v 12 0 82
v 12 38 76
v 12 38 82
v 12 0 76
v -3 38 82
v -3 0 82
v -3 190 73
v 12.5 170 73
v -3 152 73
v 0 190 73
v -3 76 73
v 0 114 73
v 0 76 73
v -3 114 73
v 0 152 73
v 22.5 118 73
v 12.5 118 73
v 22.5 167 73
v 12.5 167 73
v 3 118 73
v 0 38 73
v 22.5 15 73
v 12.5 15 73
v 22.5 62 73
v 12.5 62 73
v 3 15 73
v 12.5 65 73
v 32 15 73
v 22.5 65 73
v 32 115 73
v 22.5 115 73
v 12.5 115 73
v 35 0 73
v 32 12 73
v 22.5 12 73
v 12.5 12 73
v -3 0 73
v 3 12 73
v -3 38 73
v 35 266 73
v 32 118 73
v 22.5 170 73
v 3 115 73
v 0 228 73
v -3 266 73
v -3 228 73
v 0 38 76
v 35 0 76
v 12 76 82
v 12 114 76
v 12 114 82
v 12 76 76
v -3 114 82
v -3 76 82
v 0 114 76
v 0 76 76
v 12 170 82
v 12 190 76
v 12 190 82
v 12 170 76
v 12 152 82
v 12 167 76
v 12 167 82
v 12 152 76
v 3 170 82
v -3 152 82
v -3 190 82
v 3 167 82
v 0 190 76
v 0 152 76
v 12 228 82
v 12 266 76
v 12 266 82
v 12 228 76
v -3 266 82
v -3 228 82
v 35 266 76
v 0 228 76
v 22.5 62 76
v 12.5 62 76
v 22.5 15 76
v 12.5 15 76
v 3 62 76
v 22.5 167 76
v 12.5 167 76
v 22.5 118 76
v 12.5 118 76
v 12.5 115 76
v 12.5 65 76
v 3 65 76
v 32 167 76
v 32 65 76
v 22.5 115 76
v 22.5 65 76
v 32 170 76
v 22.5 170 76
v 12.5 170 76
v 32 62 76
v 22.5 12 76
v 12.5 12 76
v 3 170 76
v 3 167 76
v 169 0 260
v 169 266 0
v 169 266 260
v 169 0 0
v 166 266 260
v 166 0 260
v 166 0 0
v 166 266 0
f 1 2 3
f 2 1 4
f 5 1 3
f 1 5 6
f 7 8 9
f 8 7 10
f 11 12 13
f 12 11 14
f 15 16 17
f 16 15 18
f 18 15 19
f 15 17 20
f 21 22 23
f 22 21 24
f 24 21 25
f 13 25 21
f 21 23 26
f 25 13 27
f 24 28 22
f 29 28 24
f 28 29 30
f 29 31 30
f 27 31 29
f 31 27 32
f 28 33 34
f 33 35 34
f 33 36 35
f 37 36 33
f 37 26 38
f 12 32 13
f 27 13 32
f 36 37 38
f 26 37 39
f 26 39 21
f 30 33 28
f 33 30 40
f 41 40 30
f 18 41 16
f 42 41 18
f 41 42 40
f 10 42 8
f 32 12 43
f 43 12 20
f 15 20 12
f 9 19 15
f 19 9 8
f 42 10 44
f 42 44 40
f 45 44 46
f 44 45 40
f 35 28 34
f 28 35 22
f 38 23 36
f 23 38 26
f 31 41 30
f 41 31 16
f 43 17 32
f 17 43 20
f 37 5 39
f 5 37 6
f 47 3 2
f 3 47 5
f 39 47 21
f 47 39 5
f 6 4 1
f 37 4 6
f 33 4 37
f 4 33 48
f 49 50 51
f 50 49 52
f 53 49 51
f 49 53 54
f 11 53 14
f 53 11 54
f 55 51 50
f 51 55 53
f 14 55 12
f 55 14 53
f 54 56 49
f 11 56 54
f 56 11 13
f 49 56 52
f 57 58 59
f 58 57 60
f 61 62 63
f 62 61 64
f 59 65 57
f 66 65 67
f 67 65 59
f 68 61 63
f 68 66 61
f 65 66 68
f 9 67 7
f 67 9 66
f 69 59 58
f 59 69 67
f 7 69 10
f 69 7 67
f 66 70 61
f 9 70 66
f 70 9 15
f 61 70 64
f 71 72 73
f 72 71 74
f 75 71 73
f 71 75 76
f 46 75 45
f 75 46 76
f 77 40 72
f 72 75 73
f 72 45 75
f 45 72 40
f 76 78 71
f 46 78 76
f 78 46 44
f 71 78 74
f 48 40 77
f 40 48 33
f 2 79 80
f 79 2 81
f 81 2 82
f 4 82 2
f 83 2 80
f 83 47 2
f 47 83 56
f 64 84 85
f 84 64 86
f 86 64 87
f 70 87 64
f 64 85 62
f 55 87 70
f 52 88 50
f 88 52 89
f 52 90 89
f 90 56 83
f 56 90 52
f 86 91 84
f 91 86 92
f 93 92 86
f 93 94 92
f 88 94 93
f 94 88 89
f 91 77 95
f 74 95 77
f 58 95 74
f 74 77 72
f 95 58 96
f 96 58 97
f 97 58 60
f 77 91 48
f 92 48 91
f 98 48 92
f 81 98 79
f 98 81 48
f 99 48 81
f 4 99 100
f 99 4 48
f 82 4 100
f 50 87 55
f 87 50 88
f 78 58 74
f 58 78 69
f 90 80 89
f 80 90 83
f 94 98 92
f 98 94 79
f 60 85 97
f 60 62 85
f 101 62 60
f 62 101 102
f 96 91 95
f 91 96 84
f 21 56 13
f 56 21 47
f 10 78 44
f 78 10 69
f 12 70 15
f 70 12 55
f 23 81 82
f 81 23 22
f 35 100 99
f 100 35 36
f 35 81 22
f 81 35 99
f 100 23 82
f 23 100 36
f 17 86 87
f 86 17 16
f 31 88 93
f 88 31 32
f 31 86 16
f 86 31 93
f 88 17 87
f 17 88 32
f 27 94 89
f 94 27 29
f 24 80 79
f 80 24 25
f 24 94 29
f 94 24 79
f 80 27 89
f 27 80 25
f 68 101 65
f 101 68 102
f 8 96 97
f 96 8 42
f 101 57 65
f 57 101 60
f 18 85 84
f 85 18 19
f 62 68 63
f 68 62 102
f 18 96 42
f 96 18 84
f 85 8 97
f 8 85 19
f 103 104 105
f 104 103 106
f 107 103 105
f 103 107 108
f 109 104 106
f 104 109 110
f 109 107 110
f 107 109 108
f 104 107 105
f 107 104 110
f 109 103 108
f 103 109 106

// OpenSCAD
zyxelNasColor = [
    (26 / 255),
    (188 / 255),
    (156 / 255)
];
nasWidth = 124;
nasHeight = 164;
nasDepth = 206;
nasBackCableSapce = 42;

switchColor = [
    (155 / 255),
    (89 / 255),
    (182 / 255)
];
switchWidth = 117;
switchHeight = 26;
switchDepth = 65;
switchBackCableSapce = 60;
switchLeftCableSapce = 14;

raspPiColor = [
    (231 / 255),
    (76 / 255),
    (60 / 255)
];
raspPiWidth = 68;
raspPiHeight = 45;
raspPiDepth = 104;
raspPiBackCableSapce = 40;
raspPiRightCableSapce = 30;

ankerHubColor = [
    (46 / 255),
    (204 / 255),
    (113 / 255)
];
ankerHubWidth = 26;
ankerHubHeight = 70;
ankerHubDepth = 100;
ankerHubBackCableSapce = 64;

networkSwitchColor = [
    (52 / 255),
    (73 / 255),
    (94 / 255)
];
networkSwitchWidth = 29;
networkSwitchHeight = 158;
networkSwitchDepth = 102;
networkSwitchBackCableSapce = 45;
networkSwitchFrontCableSapce = 50;

frontCoverColor = [
    (231 / 255),
    (76 / 255),
    (60 / 255)
];

module zxyelNas() {
    totalDepth = nasDepth + nasBackCableSapce;
    
    color(zyxelNasColor)
    
    cube([nasWidth, nasDepth, nasHeight]);
}

module hdmiSwitch() {
    totalWidth = switchWidth + switchLeftCableSapce;
    totalDepth = switchDepth + switchBackCableSapce;
    
    color(switchColor)
    translate([switchLeftCableSapce, 0, 0]) {
        cube([switchWidth, switchDepth, switchHeight]);
    }
}

module raspPi() {
    totalWidth = raspPiWidth + raspPiRightCableSapce;
    totalDepth = raspPiDepth + raspPiBackCableSapce;
    
    color(raspPiColor)
    
    cube([totalWidth, totalDepth, raspPiHeight]);
}

module ankerHub() {
    
    color(ankerHubColor)
    
    cube([ankerHubWidth, ankerHubDepth, ankerHubHeight]);
}

module networkSwitch() {
    totalDepth = networkSwitchDepth + networkSwitchBackCableSapce + networkSwitchFrontCableSapce;
    
    color(networkSwitchColor)
    translate([0, networkSwitchFrontCableSapce, 0]) {
        cube([networkSwitchWidth, networkSwitchDepth, networkSwitchHeight]);
    }
}

acrylicThickness = 3;
itemIdentation = 12 + acrylicThickness;

leftThickness = acrylicThickness + networkSwitchWidth + acrylicThickness;

rightThickness = switchWidth + switchLeftCableSapce + acrylicThickness;

boxWidth = leftThickness + rightThickness;
boxDepth = 266;
boxHeight = acrylicThickness + nasHeight + acrylicThickness + switchHeight + acrylicThickness + raspPiHeight + 16;

module base() {
    cube([boxWidth, boxDepth, acrylicThickness]);
}

module left() {
    echo(boxHeight);
    echo(boxDepth);
    cube([acrylicThickness, boxDepth, boxHeight]);
}

module ankerHubHolder(extendTeeth = false) {
    numberOfTeeth = 5;
    totalTeethHeight = ankerHubHeight + (acrylicThickness * 2);
    toothHeight = totalTeethHeight / numberOfTeeth;
    
    teethWidth = extendTeeth ? (acrylicThickness * 3) : 0;
    
    union() {
        difference() {
             translate([-(teethWidth / 2), 0, acrylicThickness]) {
                color(frontCoverColor) cube([networkSwitchWidth + (2 * acrylicThickness) + teethWidth, acrylicThickness, ankerHubHeight]);
             }
            
            translate([((networkSwitchWidth - (ankerHubWidth - 8)) / 2 + acrylicThickness), -acrylicThickness, 2 + acrylicThickness]) {
                cube([ankerHubWidth - 8, acrylicThickness * 3, ankerHubHeight - 2 - 8]);
            }
            
            teethLeftX = -teethWidth - acrylicThickness;
            for(zPosition = [0 : 2 : numberOfTeeth]) {
                translate([teethLeftX, - acrylicThickness, zPosition * toothHeight]) {
                    cube([teethWidth + (acrylicThickness * 2), acrylicThickness * 3, toothHeight]);
                }
            }
            
            teethRightX = ankerHubWidth + (acrylicThickness * 2);
            for(zPosition = [0 : 2 : numberOfTeeth]) {
                translate([teethRightX, - acrylicThickness, zPosition * toothHeight]) {
                    cube([teethWidth + (acrylicThickness * 2), acrylicThickness * 3, toothHeight]);
                }
            }
        }
        
        translate([(networkSwitchWidth / 2) - (10 / 2) + acrylicThickness, 0, -teethWidth]) {
            color(frontCoverColor) cube([10, acrylicThickness, teethWidth + acrylicThickness]);
        }
        
        translate([(networkSwitchWidth / 2) - (10 / 2) + acrylicThickness, 0, ankerHubHeight + acrylicThickness]) {
            color(frontCoverColor) cube([10, acrylicThickness, teethWidth + acrylicThickness]);
        }
    }
}

module ankerHubFrontBack(extendTeeth = false) {
    // Anker Hub Front    
    translate([0, itemIdentation - acrylicThickness, 0]) {
        ankerHubHolder(extendTeeth);
    }
    
    // Anker Hub Back
    translate([0, itemIdentation + ankerHubDepth, 0]) {
        ankerHubHolder(extendTeeth);
    }
}

module networkSwitchHolder(extendTeeth = false) {
    numberOfTeeth = 7;
    totalTeethHeight = boxHeight - ankerHubHeight;
    toothHeight = totalTeethHeight / numberOfTeeth;
    
    teethWidth = extendTeeth ? (acrylicThickness * 3) : 0;
    
    difference() {
        translate([-(teethWidth / 2), 0, acrylicThickness]) {
            color(frontCoverColor) cube([
                networkSwitchWidth + (2 * acrylicThickness) + teethWidth,
                acrylicThickness,
                boxHeight - ankerHubHeight - acrylicThickness + teethWidth
            ]);
        }
        
        // Cut out the middle
        translate([(networkSwitchWidth / 2) - ((networkSwitchWidth - 4) / 2) + acrylicThickness, -acrylicThickness, 12 + acrylicThickness]) {
            cube([networkSwitchWidth - 4, acrylicThickness * 3, networkSwitchHeight - 24]);
        }
        
        // Cut out the top
        translate([(networkSwitchWidth / 2) - (18 / 2) + acrylicThickness, -acrylicThickness, (((boxHeight - ankerHubHeight) - networkSwitchHeight) / 2) - 9 + networkSwitchHeight]) {
            cube([18, acrylicThickness * 3, 26 + teethWidth]);
        }
        
        teethLeftX = -teethWidth - acrylicThickness;
        for(zPosition = [0 : 2 : numberOfTeeth]) {
            translate([teethLeftX, - acrylicThickness, zPosition * toothHeight]) {
                cube([teethWidth + (acrylicThickness * 2), acrylicThickness * 3, toothHeight]);
            }
        }
        
        teethRightX = networkSwitchWidth + acrylicThickness;
        for(zPosition = [0 : 2 : numberOfTeeth]) {
            translate([teethRightX, - acrylicThickness, zPosition * toothHeight]) {
                cube([teethWidth + (acrylicThickness * 2), acrylicThickness * 3, toothHeight]);
            }
        }
        
        translate([teethLeftX, - acrylicThickness, numberOfTeeth * toothHeight]) {
            cube([teethWidth + (acrylicThickness * 2), acrylicThickness * 3, toothHeight]);
        }
        translate([teethRightX, - acrylicThickness, numberOfTeeth * toothHeight]) {
            cube([teethWidth + (acrylicThickness * 2), acrylicThickness * 3, toothHeight]);
        }
    }
    
    translate([(networkSwitchWidth / 2) - (10 / 2) + acrylicThickness, 0, -teethWidth]) {
        color(frontCoverColor) cube([10, acrylicThickness, acrylicThickness + teethWidth]);
    }
}

module networkSwitchFrontBack(extendTeeth) {
    teethHeight = networkSwitchHeight + (acrylicThickness * 2);
    numberOfTeeth = teethHeight / 7;
    
    // Network Switch Front
    translate([0, networkSwitchFrontCableSapce + itemIdentation - acrylicThickness, ankerHubHeight + acrylicThickness]) {
        networkSwitchHolder(extendTeeth);
    }
    
    // Network Switch Back
    translate([0, networkSwitchFrontCableSapce + itemIdentation + networkSwitchDepth, ankerHubHeight + acrylicThickness]) {
        networkSwitchHolder(extendTeeth);
    }
}

module leftFirstShelf() {
    extendTeeth = true;
    numberOfTeeth = 7;
    totalTeethDepth = boxDepth;
    toothDepth = totalTeethDepth / numberOfTeeth;
    
    teethWidth = extendTeeth ? (acrylicThickness * 3) : 0;
    
    difference() {
        translate([0, 0, acrylicThickness + ankerHubHeight]) {
            cube([networkSwitchWidth + (acrylicThickness * 2), boxDepth, acrylicThickness]);
            
            teethLeftX = -teethWidth - acrylicThickness;
            for(yPosition = [0 : 2 : numberOfTeeth]) {
                translate([- acrylicThickness, yPosition * toothDepth, 0]) {
                    cube([teethWidth + (acrylicThickness * 2), toothDepth, acrylicThickness * 3]);
                }
            }
        }
        
        ankerHubFrontBack(true);
    
        networkSwitchFrontBack(true);
    }
    
    // ankerHubFrontBack();
    
    // networkSwitchFrontBack();
}

module rightFirstShelf() {
    translate([leftThickness, 0, acrylicThickness + nasHeight]) {
        cube([rightThickness, boxDepth, acrylicThickness]);
    }
}

module rightSecondShelf() {
    translate([leftThickness, 0, acrylicThickness + nasHeight + acrylicThickness + switchHeight]) {
        cube([rightThickness, boxDepth, acrylicThickness]);
    }
}

/** difference() {
    left();
    
    ankerHubFrontBack(true);
    networkSwitchFrontBack(true);
}

difference() {
    translate([acrylicThickness + networkSwitchWidth, 0, 0]) {
        left();
    }
    
    ankerHubFrontBack(true);
    networkSwitchFrontBack(true);
}**/

leftFirstShelf();

translate([leftThickness + switchWidth + switchLeftCableSapce, 0, 0]) {
    left();
}

/**difference() {
    base();
    ankerHubFrontBack(true);
}

rightFirstShelf();
rightSecondShelf();

translate([0, 0, boxHeight]) {
   base();
}**/


/** 
translate([acrylicThickness, itemIdentation, acrylicThickness]) {
    ankerHub();
}

translate([acrylicThickness, itemIdentation, acrylicThickness + ankerHubHeight + acrylicThickness]) {
    networkSwitch();
}

translate([leftThickness, itemIdentation,acrylicThickness]) {
    zxyelNas();
}

translate([leftThickness, itemIdentation, acrylicThickness + nasHeight + acrylicThickness]) {
    hdmiSwitch();
}

translate([leftThickness, itemIdentation, acrylicThickness + nasHeight + acrylicThickness + switchHeight + acrylicThickness]) {
    raspPi();
}**/
